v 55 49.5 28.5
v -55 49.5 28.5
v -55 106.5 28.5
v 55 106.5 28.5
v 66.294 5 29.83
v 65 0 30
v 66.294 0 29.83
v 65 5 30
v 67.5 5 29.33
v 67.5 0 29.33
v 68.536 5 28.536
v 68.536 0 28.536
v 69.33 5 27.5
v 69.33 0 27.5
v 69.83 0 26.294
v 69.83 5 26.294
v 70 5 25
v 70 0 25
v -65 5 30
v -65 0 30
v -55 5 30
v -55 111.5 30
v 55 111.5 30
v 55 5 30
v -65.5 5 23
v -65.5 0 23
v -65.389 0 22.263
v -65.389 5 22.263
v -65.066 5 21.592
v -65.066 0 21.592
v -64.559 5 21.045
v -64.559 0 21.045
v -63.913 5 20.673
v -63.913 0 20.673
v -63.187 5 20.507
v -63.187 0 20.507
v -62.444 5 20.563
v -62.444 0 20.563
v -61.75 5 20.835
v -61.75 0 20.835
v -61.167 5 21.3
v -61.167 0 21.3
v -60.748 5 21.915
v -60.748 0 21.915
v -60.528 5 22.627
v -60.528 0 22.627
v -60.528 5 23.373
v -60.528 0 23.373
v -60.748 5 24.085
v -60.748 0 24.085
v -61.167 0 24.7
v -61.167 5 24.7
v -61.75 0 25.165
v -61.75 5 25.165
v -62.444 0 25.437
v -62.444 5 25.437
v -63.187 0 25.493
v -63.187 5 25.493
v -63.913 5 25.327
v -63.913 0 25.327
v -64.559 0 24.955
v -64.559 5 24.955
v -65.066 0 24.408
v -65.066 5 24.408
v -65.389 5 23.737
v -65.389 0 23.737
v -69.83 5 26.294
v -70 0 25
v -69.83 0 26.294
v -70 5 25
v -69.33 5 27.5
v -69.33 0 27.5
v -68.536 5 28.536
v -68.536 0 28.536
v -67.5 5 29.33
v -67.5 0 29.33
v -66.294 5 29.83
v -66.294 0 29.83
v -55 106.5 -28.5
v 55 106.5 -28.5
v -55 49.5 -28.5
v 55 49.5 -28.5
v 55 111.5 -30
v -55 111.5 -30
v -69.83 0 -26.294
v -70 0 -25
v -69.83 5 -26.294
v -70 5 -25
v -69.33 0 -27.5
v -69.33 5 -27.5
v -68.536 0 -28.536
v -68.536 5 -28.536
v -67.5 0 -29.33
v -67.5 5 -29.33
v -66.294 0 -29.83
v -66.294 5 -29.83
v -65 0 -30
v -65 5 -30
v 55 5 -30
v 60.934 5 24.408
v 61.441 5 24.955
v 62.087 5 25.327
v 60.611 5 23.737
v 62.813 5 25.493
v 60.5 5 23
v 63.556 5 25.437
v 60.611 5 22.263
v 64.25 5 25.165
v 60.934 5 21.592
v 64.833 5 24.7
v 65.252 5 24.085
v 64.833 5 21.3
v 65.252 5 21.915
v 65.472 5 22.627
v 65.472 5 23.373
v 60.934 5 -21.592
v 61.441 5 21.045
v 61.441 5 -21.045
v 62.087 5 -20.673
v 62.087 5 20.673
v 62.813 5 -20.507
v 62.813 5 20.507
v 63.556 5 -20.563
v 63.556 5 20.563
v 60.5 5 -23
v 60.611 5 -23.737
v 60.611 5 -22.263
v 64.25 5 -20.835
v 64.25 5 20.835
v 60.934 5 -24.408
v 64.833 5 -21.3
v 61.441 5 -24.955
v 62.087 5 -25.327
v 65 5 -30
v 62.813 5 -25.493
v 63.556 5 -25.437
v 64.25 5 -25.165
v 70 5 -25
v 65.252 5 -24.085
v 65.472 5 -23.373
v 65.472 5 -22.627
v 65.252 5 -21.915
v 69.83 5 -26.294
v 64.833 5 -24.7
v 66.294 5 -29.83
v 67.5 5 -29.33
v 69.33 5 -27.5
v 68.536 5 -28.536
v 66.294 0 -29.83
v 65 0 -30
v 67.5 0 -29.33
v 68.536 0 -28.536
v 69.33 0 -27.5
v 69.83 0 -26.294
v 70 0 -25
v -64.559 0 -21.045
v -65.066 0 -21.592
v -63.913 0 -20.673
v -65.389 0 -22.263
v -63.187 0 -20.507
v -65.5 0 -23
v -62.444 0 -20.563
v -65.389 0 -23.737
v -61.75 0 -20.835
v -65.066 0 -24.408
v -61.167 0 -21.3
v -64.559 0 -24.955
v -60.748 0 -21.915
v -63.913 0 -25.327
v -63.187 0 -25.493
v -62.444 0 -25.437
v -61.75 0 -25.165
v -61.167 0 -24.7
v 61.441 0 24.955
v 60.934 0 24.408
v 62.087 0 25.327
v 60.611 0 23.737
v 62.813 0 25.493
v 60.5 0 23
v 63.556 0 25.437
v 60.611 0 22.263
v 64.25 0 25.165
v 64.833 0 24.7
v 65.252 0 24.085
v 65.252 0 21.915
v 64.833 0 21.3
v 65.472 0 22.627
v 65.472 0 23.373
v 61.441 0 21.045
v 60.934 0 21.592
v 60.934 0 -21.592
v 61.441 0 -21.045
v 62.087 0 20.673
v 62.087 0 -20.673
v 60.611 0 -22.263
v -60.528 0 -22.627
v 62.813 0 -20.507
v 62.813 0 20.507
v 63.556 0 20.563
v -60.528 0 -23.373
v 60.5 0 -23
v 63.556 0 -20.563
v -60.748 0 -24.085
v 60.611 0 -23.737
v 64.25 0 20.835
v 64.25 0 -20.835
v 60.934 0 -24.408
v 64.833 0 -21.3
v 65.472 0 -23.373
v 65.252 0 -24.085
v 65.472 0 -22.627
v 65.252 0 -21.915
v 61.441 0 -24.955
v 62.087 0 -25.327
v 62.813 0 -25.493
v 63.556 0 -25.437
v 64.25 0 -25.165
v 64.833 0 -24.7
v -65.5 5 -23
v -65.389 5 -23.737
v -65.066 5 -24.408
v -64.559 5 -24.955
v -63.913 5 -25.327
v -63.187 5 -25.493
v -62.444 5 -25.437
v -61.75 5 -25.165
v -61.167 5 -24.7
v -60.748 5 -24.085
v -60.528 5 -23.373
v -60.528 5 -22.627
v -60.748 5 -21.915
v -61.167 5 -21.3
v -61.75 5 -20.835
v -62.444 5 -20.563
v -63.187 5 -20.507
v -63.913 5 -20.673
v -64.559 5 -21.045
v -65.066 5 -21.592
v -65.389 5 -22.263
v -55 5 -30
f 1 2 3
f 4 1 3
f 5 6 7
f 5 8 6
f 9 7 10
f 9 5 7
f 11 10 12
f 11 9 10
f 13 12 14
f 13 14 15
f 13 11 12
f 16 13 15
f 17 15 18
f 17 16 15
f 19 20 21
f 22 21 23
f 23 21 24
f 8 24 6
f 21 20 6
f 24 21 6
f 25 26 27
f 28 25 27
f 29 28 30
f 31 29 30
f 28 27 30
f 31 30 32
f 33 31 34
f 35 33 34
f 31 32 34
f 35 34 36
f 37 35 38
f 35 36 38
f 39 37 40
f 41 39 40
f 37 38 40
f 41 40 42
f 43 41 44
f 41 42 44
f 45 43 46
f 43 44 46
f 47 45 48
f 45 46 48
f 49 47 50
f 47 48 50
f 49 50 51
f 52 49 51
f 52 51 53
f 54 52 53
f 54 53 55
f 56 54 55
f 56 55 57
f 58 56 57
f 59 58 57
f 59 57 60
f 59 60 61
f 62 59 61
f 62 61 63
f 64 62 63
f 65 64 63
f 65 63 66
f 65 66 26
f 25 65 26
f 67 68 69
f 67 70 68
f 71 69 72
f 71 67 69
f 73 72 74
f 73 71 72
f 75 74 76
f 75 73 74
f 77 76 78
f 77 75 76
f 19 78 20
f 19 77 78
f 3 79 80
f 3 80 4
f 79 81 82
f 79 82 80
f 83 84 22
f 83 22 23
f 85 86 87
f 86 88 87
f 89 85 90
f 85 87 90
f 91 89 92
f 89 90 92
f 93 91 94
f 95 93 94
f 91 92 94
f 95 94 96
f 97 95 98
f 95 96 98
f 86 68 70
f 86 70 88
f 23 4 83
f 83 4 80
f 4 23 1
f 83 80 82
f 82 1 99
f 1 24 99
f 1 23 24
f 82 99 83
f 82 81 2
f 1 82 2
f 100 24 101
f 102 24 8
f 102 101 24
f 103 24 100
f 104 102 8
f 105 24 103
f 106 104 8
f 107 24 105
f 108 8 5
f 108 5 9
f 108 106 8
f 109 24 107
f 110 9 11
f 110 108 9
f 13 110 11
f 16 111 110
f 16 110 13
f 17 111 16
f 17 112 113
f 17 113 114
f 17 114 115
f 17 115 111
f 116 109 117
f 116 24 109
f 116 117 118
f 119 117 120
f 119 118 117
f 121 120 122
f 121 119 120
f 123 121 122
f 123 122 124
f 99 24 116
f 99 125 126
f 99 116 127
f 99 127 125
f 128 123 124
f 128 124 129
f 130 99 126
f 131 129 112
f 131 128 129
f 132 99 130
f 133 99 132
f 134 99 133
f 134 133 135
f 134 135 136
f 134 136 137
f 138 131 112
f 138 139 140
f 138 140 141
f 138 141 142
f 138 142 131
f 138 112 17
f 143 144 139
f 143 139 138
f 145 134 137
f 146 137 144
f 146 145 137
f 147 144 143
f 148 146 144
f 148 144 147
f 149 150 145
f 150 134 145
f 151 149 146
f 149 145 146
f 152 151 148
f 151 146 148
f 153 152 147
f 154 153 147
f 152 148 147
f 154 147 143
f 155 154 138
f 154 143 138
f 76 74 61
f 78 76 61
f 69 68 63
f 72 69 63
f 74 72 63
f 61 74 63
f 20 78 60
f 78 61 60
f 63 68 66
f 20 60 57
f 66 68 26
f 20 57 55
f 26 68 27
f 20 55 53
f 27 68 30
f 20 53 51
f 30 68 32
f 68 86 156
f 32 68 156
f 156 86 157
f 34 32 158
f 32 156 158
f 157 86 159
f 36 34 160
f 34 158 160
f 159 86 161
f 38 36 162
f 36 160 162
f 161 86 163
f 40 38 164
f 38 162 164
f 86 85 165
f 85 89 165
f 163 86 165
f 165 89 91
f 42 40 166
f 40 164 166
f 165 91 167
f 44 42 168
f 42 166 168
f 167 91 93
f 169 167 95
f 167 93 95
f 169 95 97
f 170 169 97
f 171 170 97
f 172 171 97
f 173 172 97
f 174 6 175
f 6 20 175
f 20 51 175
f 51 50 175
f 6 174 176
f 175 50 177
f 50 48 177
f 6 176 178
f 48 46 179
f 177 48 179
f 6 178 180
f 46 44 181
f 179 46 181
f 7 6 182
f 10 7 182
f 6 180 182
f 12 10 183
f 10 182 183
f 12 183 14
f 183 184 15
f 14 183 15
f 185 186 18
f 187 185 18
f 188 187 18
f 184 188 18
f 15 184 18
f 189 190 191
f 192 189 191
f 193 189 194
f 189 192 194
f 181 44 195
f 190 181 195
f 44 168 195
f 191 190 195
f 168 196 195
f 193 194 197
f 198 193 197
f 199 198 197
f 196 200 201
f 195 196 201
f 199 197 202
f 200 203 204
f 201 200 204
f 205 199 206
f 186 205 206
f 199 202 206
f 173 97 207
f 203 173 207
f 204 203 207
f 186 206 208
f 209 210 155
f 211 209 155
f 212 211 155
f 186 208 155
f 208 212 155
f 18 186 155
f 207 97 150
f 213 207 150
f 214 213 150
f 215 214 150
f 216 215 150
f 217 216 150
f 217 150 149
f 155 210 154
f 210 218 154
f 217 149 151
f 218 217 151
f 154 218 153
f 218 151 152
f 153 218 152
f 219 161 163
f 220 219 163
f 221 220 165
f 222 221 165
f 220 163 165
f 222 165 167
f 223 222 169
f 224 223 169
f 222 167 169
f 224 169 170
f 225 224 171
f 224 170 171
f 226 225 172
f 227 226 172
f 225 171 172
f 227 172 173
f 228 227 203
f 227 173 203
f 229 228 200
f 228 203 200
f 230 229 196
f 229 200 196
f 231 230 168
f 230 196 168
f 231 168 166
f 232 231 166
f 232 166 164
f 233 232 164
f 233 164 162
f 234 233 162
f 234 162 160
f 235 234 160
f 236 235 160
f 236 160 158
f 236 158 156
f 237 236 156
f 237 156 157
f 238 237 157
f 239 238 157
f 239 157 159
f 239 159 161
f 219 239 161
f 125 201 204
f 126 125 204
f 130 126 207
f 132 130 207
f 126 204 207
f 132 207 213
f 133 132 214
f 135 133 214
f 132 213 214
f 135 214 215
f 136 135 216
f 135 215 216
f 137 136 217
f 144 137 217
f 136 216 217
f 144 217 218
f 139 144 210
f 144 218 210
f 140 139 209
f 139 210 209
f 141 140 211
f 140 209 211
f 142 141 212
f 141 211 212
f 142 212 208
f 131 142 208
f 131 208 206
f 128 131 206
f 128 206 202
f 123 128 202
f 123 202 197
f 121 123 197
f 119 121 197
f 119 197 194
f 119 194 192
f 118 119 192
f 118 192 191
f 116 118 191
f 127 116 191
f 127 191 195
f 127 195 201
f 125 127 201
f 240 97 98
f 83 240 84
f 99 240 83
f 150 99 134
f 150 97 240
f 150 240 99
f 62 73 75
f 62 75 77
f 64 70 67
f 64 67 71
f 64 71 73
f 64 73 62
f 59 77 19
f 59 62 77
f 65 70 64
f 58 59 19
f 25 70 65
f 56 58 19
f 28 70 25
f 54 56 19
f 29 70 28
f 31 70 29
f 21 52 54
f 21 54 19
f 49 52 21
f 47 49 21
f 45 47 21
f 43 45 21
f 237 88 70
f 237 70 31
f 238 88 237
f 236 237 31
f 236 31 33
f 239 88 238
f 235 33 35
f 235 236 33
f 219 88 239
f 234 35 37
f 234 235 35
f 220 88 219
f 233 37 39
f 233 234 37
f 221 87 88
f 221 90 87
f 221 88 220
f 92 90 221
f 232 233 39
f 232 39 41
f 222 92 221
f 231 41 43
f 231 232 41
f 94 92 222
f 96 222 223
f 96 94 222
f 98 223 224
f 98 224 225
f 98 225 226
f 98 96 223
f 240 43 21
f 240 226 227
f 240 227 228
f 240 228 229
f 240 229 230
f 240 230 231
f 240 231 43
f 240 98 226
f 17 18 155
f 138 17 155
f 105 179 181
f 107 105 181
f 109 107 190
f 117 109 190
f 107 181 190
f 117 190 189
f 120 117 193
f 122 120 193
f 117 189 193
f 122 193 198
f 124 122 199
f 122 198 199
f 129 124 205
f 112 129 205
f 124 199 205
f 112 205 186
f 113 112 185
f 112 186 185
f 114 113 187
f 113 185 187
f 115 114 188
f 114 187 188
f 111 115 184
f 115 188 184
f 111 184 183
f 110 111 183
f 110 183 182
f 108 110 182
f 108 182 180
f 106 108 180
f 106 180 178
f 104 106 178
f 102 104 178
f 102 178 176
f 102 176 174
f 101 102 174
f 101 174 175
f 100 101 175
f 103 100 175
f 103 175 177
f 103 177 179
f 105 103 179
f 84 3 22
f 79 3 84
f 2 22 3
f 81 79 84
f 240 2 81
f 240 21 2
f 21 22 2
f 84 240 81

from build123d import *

# Parameters (mm, degrees)
SKETCH_1_W          = 140
SKETCH_1_H          = 60
EXTRUDE_3_DEPTH     = 5
SKETCH_3_W          = 110
SKETCH_3_H          = 60
EXTRUDE_4_DEPTH     = 106.5
FILLET_1_R          = 5
SKETCH_19_W         = 57
SKETCH_19_H         = 57
CUT_EXTRUDE_1_DEPTH = 160
HOLE_WIZARD_M6_2_D  = 5


with BuildPart() as part:
    # 草图1 → 凸台-拉伸3 (new body)
    with BuildSketch(Plane(origin=(0, 0, 0), x_dir=(1, 0, 0), z_dir=(0, 1, 0))):
        Rectangle(SKETCH_1_W, SKETCH_1_H)
    extrude(amount=EXTRUDE_3_DEPTH)

    # 草图3 → 凸台-拉伸4 (add)
    with BuildSketch(Plane(origin=(0, 5, 0), x_dir=(1, 0, 0), z_dir=(0, 1, 0))):
        Rectangle(SKETCH_3_W, SKETCH_3_H)
    extrude(amount=EXTRUDE_4_DEPTH)

    # 圆角1
    fillet_1_edges = [part.edges().sort_by_distance(p)[0] for p in [
        (70, 2.5, 30),
        (-70, 2.5, 30),
        (-70, 2.5, -30),
        (70, 2.5, -30),
    ]]
    fillet(fillet_1_edges, radius=FILLET_1_R)

    # 草图19 → 切除-拉伸1 (cut)
    with BuildSketch(Plane.ZY.offset(55)):
        with Locations((0, 78)):
            Rectangle(SKETCH_19_W, SKETCH_19_H)
    extrude(amount=-CUT_EXTRUDE_1_DEPTH, mode=Mode.SUBTRACT)

    # M6 螺纹孔2 (through all)
    with Locations(Plane(origin=(0, 5, 0), x_dir=(1, 0, 0), z_dir=(0, 1, 0))):
        with Locations((-63, 23), (63, 23), (63, -23), (-63, -23)):
            Hole(HOLE_WIZARD_M6_2_D / 2)


solid = part.part
